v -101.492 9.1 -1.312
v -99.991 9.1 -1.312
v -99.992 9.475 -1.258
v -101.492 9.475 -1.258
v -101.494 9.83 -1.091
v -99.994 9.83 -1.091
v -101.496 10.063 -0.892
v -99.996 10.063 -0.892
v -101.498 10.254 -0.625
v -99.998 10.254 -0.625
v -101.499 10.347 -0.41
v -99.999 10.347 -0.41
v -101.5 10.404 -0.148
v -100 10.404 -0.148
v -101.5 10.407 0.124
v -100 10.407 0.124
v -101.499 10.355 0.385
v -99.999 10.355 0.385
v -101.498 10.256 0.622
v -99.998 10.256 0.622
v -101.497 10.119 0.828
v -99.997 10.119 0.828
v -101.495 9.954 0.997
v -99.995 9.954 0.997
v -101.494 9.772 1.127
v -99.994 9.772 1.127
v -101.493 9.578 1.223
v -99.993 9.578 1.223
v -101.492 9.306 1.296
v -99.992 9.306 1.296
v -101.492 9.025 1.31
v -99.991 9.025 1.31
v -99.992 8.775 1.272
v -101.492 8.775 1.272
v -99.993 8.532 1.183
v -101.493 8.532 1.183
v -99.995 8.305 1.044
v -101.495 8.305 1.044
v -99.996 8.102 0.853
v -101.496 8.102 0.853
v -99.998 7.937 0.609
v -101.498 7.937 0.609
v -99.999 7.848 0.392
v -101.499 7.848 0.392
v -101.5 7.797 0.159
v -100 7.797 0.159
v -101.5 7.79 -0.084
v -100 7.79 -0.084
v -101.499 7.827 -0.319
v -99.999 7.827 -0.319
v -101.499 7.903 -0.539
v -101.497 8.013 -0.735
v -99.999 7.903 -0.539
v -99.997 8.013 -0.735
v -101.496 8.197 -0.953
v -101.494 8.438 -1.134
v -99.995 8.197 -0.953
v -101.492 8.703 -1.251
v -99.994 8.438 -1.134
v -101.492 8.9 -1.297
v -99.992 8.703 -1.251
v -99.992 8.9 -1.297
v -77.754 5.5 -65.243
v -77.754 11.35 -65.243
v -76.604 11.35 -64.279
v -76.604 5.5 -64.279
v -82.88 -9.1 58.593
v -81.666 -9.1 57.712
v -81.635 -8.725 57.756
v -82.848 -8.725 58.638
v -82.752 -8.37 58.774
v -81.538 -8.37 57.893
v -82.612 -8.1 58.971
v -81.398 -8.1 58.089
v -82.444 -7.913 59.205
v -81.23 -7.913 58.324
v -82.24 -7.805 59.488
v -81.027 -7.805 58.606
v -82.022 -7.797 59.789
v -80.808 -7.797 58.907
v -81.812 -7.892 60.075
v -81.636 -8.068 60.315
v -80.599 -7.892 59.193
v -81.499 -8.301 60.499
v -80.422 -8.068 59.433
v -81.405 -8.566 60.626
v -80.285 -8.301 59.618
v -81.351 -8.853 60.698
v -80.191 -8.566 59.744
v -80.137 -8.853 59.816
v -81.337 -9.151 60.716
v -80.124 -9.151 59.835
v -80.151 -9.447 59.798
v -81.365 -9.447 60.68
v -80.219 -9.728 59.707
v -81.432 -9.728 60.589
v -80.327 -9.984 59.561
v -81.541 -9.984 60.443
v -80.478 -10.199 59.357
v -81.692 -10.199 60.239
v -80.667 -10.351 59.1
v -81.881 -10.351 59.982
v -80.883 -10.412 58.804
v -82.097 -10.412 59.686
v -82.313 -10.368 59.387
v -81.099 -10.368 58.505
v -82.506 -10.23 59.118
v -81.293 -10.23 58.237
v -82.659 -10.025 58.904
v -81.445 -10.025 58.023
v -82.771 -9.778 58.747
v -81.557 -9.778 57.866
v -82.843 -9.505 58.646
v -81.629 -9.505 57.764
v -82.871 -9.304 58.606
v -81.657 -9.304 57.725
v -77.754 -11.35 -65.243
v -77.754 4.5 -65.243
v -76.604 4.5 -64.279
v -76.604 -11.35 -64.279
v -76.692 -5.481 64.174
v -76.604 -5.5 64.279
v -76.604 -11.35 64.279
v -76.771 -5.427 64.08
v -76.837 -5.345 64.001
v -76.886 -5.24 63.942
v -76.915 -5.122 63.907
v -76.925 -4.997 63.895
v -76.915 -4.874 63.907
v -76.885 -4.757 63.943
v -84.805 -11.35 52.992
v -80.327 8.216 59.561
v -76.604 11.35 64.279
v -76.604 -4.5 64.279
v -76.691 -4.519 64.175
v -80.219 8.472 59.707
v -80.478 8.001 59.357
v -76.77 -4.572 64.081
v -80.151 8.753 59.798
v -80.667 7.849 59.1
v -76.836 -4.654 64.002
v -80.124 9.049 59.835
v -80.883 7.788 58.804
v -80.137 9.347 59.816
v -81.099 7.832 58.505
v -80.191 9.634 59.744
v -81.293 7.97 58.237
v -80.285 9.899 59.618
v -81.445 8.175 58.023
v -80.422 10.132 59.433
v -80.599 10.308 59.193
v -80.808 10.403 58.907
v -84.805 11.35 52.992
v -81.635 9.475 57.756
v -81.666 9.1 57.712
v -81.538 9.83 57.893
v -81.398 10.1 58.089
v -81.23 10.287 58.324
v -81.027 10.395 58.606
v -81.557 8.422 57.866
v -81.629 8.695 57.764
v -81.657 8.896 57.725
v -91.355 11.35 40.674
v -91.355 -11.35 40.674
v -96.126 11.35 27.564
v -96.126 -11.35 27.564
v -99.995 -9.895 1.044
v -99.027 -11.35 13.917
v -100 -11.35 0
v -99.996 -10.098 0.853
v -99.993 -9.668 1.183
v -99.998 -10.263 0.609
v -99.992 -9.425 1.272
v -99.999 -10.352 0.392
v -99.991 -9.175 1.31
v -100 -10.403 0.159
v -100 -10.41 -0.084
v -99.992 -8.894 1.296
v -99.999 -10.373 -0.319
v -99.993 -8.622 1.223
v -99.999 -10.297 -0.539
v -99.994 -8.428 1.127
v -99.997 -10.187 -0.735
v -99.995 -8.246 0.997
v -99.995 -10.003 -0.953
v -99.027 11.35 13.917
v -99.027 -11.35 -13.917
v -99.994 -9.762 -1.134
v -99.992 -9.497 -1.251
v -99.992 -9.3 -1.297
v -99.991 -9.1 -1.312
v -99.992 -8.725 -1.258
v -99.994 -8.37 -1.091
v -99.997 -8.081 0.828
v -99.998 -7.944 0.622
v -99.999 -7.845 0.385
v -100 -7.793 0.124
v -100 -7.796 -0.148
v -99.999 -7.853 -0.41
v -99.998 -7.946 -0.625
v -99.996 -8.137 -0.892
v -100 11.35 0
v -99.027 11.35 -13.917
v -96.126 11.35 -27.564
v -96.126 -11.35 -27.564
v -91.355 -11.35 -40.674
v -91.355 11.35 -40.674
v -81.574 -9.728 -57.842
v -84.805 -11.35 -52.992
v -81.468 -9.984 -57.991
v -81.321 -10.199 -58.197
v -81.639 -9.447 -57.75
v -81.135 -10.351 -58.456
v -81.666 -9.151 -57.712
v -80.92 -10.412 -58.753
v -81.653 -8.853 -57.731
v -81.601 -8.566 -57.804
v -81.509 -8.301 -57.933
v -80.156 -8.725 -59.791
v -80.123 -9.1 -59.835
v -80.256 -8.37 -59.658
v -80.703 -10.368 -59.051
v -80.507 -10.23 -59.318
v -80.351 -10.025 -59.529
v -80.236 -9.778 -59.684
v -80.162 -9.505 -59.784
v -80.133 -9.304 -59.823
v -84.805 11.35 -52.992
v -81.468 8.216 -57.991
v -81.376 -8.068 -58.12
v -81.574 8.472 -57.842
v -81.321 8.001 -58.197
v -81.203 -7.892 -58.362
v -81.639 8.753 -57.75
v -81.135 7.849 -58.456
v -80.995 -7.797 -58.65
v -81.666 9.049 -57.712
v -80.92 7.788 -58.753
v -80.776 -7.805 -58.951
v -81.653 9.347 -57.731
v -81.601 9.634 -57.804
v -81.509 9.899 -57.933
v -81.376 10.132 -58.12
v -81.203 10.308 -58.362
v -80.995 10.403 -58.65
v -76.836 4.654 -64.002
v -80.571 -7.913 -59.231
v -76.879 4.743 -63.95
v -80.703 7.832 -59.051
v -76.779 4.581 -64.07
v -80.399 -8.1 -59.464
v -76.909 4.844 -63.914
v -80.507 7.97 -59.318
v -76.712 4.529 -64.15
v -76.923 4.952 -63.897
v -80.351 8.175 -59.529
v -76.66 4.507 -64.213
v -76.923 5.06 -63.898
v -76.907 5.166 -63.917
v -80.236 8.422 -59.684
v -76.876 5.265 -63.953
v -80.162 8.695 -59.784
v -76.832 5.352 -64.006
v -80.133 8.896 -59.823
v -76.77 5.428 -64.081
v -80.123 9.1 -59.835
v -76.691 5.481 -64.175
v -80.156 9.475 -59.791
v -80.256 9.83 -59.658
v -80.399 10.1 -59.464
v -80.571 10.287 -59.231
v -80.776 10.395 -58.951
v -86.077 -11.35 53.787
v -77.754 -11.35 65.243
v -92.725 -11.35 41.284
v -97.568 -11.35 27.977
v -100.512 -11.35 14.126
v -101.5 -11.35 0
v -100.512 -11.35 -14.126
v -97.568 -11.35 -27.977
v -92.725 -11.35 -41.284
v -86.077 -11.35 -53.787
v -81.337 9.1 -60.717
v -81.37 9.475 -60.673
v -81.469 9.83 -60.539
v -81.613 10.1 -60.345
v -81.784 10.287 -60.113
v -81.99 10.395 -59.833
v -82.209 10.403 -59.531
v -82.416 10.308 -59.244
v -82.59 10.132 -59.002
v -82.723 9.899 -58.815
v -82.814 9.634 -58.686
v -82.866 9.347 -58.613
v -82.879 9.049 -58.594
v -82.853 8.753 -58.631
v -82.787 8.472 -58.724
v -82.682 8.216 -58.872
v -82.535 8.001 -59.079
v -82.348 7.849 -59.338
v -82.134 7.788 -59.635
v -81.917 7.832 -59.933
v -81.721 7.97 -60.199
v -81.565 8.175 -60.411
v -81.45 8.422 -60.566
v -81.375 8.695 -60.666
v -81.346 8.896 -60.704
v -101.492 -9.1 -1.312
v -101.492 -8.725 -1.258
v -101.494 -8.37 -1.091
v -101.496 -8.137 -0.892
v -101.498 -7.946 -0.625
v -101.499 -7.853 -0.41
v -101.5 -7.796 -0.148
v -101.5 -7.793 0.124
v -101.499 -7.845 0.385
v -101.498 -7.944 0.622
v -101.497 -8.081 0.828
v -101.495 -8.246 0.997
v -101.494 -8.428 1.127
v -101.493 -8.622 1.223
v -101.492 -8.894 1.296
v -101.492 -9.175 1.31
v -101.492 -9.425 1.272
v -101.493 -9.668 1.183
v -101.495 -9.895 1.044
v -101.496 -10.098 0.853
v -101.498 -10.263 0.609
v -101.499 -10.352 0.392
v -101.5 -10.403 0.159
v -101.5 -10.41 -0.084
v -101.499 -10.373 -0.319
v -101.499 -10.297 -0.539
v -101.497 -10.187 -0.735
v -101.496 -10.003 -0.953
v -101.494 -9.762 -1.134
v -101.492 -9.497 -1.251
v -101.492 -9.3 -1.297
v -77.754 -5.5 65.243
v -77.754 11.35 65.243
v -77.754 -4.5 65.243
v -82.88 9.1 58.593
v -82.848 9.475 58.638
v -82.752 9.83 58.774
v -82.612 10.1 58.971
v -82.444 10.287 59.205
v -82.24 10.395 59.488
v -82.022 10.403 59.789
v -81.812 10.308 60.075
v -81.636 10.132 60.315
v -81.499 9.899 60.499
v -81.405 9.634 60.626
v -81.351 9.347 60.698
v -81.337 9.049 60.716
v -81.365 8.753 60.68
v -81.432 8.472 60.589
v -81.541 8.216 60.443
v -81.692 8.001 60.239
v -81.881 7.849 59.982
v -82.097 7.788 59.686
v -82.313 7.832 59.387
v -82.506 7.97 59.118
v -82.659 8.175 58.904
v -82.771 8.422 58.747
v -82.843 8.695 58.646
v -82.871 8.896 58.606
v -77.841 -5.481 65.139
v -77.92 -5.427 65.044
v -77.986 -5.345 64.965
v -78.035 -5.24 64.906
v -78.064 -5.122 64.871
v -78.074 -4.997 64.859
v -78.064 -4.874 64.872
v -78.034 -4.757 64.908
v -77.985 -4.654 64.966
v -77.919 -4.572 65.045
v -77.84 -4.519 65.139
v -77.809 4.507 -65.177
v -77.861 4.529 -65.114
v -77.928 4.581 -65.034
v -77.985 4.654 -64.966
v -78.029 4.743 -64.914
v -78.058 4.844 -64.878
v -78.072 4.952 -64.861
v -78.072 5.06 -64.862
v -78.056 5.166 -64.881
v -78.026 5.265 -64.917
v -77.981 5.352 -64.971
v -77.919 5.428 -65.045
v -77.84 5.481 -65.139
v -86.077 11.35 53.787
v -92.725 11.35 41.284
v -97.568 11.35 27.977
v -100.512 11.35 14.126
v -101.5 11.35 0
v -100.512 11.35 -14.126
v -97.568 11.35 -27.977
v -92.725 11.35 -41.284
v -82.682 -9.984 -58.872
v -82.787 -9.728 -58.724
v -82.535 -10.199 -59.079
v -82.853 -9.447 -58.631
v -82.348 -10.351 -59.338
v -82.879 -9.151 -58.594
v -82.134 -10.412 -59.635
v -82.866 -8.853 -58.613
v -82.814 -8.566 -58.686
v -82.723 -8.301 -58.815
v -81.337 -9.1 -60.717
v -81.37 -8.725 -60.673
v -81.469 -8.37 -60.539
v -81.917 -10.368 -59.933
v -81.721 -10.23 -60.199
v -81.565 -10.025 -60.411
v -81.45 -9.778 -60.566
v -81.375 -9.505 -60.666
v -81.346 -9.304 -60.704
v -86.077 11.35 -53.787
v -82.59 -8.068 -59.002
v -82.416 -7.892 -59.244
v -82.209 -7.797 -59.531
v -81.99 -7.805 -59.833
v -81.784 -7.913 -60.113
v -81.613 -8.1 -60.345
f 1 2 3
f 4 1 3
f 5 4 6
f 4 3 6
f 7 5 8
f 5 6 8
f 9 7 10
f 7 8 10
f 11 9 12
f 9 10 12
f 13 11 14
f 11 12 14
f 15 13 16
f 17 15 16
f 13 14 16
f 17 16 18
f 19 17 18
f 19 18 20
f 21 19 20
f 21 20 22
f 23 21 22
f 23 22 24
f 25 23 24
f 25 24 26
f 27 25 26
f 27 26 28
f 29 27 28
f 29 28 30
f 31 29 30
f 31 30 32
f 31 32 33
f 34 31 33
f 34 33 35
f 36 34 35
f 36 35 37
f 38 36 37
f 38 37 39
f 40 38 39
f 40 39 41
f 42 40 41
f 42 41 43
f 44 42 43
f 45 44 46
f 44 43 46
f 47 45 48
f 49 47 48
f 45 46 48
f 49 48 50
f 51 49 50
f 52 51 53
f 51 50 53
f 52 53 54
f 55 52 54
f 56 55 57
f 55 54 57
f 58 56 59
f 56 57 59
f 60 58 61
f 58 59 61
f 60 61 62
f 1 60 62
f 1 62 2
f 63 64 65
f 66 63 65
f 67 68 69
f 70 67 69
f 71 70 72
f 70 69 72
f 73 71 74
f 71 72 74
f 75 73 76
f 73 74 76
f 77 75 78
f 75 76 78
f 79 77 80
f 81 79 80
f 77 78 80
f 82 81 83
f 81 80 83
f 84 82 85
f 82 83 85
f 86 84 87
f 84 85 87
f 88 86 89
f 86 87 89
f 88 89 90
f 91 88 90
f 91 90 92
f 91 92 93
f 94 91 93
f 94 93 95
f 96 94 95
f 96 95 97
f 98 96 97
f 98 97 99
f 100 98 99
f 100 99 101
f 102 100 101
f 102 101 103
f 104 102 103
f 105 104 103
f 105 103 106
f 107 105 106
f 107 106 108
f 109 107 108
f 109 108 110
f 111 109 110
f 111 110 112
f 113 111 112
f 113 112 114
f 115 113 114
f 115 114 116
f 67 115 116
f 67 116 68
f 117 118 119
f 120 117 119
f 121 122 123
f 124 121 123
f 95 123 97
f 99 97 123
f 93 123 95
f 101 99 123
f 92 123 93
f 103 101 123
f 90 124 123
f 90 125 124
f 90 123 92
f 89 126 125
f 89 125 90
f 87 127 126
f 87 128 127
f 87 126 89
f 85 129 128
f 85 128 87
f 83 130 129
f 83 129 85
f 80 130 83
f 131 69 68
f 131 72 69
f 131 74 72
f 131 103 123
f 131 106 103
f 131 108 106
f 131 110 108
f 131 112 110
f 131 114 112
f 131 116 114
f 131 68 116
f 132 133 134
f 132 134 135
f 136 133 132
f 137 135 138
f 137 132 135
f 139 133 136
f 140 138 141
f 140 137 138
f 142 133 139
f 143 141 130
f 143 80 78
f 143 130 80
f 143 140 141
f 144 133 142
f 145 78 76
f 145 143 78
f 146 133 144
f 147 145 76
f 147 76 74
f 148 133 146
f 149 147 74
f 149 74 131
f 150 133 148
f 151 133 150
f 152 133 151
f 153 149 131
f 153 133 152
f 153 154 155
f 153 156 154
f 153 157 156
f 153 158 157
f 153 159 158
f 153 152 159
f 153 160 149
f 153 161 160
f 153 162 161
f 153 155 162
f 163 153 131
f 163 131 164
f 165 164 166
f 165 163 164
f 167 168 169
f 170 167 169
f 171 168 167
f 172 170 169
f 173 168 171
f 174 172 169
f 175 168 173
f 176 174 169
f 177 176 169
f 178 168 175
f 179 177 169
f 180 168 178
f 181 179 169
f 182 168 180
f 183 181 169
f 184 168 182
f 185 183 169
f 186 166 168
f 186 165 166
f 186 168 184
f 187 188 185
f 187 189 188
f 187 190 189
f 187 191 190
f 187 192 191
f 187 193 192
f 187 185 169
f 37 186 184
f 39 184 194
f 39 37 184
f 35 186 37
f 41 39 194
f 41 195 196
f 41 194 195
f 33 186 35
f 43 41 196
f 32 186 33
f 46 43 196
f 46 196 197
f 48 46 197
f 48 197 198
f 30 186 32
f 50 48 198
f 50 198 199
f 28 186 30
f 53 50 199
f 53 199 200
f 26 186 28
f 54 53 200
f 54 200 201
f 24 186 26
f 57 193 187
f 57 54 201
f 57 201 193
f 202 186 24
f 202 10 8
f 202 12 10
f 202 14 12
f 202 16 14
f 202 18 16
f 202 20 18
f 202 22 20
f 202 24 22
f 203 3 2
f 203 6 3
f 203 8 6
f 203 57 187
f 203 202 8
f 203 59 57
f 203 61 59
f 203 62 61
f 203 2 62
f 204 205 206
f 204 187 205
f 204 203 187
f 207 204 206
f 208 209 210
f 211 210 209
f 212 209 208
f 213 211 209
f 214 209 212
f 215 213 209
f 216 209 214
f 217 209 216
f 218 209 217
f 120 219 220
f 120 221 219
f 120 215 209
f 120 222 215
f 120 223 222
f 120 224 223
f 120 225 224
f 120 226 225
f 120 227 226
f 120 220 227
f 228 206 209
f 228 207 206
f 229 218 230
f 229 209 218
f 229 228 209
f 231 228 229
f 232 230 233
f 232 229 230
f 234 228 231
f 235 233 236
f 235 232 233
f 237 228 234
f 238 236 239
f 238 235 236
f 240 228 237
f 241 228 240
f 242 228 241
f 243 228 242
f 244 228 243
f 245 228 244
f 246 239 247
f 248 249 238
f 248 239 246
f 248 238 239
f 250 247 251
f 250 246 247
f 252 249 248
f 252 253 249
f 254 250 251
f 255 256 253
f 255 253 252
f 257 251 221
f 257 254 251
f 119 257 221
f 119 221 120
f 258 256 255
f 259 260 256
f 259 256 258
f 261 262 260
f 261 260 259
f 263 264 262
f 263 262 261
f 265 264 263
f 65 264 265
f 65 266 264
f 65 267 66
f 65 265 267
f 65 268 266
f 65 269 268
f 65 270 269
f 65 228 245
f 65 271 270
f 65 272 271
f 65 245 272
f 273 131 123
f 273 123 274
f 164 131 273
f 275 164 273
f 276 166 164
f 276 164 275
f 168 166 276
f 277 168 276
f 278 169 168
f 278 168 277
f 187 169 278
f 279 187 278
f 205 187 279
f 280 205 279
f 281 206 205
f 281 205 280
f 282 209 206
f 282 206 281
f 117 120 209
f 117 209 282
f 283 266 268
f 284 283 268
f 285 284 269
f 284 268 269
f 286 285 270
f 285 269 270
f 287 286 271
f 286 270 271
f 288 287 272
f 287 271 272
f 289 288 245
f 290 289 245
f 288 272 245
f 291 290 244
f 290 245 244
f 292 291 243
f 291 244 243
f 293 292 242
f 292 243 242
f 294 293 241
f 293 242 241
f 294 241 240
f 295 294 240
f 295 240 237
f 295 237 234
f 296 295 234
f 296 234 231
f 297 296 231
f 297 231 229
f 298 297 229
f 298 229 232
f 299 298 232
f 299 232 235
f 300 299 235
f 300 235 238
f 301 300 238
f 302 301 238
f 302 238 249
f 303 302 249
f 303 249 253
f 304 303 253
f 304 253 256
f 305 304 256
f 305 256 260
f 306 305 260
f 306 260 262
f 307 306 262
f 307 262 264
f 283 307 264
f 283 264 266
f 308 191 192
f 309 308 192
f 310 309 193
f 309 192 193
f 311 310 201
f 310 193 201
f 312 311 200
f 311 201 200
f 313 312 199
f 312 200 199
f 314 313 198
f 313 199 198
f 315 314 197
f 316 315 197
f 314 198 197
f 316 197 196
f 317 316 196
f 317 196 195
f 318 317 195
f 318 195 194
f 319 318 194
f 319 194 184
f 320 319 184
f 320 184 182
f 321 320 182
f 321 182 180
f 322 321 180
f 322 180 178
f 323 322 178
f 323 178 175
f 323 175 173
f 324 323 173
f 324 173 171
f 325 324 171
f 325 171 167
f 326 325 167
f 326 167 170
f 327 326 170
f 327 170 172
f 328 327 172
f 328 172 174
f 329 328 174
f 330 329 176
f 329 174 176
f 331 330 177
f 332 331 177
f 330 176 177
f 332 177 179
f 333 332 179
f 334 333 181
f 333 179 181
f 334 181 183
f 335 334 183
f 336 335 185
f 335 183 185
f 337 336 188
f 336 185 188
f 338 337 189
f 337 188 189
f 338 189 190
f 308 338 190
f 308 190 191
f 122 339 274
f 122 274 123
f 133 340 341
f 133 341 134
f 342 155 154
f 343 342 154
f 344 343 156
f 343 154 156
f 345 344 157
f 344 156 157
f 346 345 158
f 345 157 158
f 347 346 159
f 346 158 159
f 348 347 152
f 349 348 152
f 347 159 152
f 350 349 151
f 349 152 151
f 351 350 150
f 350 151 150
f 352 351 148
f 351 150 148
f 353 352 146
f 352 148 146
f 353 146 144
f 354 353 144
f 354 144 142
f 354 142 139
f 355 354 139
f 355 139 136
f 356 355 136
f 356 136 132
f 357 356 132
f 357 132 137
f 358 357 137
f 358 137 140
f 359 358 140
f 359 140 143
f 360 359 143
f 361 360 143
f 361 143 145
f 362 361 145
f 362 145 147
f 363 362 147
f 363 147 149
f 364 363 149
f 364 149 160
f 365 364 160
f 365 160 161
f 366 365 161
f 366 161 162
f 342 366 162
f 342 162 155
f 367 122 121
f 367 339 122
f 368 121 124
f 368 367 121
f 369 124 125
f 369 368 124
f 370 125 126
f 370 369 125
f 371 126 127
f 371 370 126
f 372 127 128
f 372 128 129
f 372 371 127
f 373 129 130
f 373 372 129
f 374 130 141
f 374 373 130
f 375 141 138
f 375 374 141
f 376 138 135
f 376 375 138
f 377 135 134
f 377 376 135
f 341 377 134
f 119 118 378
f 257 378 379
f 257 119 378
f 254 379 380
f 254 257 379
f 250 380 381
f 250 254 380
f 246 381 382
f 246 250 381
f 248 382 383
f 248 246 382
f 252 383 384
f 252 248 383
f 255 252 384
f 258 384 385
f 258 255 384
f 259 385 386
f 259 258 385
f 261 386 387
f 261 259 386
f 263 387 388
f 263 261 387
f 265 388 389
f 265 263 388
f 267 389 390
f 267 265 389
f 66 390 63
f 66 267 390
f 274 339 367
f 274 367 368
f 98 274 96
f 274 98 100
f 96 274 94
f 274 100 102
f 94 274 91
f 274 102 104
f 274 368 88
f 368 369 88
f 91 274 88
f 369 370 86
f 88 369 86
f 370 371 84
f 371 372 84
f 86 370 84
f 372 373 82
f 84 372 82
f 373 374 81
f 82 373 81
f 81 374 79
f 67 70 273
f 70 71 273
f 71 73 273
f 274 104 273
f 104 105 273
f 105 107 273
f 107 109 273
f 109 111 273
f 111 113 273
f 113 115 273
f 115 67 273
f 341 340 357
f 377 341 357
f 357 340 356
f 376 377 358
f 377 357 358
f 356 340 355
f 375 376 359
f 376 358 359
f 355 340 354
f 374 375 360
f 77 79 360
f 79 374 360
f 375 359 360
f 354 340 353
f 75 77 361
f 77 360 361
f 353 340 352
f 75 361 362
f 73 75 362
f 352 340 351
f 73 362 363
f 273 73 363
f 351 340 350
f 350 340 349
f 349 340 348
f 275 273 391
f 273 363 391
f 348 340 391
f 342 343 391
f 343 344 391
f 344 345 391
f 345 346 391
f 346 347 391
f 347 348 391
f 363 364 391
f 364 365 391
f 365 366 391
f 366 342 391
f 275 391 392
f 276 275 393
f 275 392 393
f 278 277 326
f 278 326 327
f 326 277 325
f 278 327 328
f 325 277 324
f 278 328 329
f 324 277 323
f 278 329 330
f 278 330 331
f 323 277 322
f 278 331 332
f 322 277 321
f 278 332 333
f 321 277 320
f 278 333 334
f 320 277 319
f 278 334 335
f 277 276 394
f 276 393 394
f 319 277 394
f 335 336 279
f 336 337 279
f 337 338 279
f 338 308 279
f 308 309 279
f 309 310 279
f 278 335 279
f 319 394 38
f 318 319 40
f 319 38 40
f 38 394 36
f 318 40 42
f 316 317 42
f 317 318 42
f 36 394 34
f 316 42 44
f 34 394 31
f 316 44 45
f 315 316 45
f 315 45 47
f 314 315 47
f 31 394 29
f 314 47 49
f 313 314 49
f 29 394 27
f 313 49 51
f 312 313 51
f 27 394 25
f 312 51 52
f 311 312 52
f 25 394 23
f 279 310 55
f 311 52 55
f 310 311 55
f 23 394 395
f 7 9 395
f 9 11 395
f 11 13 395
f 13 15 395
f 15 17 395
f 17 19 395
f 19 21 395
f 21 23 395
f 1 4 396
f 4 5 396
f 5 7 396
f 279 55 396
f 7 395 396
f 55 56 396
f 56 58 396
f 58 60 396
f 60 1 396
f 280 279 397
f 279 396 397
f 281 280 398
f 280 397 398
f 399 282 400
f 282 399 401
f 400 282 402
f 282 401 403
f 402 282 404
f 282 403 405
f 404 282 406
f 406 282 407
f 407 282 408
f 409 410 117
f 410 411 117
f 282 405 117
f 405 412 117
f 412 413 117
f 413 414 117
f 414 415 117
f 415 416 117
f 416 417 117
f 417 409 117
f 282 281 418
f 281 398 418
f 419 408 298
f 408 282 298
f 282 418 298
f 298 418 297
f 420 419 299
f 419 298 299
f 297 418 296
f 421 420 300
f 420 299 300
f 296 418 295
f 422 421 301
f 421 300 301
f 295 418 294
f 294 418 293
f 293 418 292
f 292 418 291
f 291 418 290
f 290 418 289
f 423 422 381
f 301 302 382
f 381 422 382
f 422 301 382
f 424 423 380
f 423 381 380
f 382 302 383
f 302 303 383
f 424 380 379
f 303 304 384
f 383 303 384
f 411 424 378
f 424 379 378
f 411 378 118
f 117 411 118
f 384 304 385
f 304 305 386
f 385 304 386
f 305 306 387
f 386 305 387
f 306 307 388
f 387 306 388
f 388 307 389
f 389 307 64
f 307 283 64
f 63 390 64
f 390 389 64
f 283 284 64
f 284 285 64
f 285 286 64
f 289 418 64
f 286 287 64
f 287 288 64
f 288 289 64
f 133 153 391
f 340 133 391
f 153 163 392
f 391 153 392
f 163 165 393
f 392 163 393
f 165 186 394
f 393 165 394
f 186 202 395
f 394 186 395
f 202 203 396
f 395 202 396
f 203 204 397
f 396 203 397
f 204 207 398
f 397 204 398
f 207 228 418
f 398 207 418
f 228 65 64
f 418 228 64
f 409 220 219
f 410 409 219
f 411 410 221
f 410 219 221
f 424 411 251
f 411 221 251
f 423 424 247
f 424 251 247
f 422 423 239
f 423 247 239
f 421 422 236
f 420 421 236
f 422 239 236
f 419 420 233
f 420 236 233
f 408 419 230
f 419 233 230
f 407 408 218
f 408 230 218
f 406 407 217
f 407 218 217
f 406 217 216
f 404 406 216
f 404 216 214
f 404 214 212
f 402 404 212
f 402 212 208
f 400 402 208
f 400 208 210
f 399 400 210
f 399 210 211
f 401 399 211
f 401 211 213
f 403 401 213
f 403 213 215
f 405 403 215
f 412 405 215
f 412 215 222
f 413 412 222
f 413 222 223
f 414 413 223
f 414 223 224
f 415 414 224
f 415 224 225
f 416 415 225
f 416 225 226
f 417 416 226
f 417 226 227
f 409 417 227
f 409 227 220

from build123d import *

# Parameters (mm, degrees)
SKETCH1_W                       = 1.5
SKETCH1_H                       = 22.7
REVOLVE1_ANGLE                  = 80
SKETCH2_R                       = 1.3125
CUT_EXTRUDE1_DEPTH              = 122.192879456
CIRPATTERN1_COUNT               = 2
CIRPATTERN1_ANGLE               = 36
CIRPATTERN1_THE_OTHER_WAY_COUNT = 2
CIRPATTERN1_THE_OTHER_WAY_ANGLE = 36
CUT_EXTRUDE2_DEPTH              = 133.380069744
CUT_EXTRUDE2_DEPTH_BACK         = 133.380069744
SKETCH3_R                       = 0.5
CUT_EXTRUDE3_DEPTH              = 133.380069744
CUT_EXTRUDE3_DEPTH_BACK         = 133.380069744
SKETCH4_R                       = 0.5


with BuildPart() as part:
    # Sketch1 → Revolve1 (revolve, symmetric)
    with BuildSketch(Plane.XY) as revolve1_sk:
        with Locations((-100.75, 0)):
            Rectangle(SKETCH1_W, SKETCH1_H)
    revolve(axis=Axis((0, -1000, 0), (0, 1, 0)), revolution_arc=REVOLVE1_ANGLE / 2)
    revolve(revolve1_sk.sketch, axis=Axis((0, -1000, 0), (0, -1, 0)), revolution_arc=REVOLVE1_ANGLE / 2)

    # Sketch2 → Cut-Extrude1 (cut, through all)
    with BuildSketch(Plane(origin=(0, 0, 0), x_dir=(0, 0, -1), z_dir=(1, 0, 0))):
        with Locations((0, -9.1)):
            Circle(SKETCH2_R)
        with Locations((0, 9.1)):
            Circle(SKETCH2_R)
    cut_extrude1 = extrude(amount=-CUT_EXTRUDE1_DEPTH, mode=Mode.SUBTRACT)

    # CirPattern1: Cut-Extrude1 ×2 about axis
    cirpattern1_axis = Axis((0, -1000, 0), (0, 1, 0))
    for i in range(1, CIRPATTERN1_COUNT):
        add(cut_extrude1.rotate(cirpattern1_axis, i * CIRPATTERN1_ANGLE / (CIRPATTERN1_COUNT - 1)), mode=Mode.SUBTRACT)

    # CirPattern1 the other way: Cut-Extrude1 ×2 about axis
    cirpattern1_the_other_way_axis = Axis((0, -1000, 0), (0, -1, 0))
    for i in range(1, CIRPATTERN1_THE_OTHER_WAY_COUNT):
        add(cut_extrude1.rotate(cirpattern1_the_other_way_axis, i * CIRPATTERN1_THE_OTHER_WAY_ANGLE / (CIRPATTERN1_THE_OTHER_WAY_COUNT - 1)), mode=Mode.SUBTRACT)

    # Sketch3 → Cut-Extrude2 (cut, two sides: drawn at the far end of the back side and taken through both)
    with BuildSketch(Plane(origin=(-76.604444312, 0, 64.278760969), x_dir=(-0.6427876096865407, 0, -0.7660444431189769), z_dir=(0.7660444431189769, -1.1789167470557806e-15, -0.6427876096865407)).offset(-CUT_EXTRUDE2_DEPTH_BACK)):
        with Locations((0, -5)):
            Circle(SKETCH3_R)
    extrude(amount=CUT_EXTRUDE2_DEPTH + CUT_EXTRUDE2_DEPTH_BACK, mode=Mode.SUBTRACT)

    # Sketch4 → Cut-Extrude3 (cut, two sides: drawn at the far end of the back side and taken through both)
    with BuildSketch(Plane(origin=(-76.604444312, 0, -64.278760969), x_dir=(-0.6427876096865405, 0, 0.7660444431189771), z_dir=(-0.7660444431189772, 0, -0.6427876096865405)).offset(-CUT_EXTRUDE3_DEPTH_BACK)):
        with Locations((-1e-09, 5)):
            Circle(SKETCH4_R)
    extrude(amount=CUT_EXTRUDE3_DEPTH + CUT_EXTRUDE3_DEPTH_BACK, mode=Mode.SUBTRACT)


solid = part.part
